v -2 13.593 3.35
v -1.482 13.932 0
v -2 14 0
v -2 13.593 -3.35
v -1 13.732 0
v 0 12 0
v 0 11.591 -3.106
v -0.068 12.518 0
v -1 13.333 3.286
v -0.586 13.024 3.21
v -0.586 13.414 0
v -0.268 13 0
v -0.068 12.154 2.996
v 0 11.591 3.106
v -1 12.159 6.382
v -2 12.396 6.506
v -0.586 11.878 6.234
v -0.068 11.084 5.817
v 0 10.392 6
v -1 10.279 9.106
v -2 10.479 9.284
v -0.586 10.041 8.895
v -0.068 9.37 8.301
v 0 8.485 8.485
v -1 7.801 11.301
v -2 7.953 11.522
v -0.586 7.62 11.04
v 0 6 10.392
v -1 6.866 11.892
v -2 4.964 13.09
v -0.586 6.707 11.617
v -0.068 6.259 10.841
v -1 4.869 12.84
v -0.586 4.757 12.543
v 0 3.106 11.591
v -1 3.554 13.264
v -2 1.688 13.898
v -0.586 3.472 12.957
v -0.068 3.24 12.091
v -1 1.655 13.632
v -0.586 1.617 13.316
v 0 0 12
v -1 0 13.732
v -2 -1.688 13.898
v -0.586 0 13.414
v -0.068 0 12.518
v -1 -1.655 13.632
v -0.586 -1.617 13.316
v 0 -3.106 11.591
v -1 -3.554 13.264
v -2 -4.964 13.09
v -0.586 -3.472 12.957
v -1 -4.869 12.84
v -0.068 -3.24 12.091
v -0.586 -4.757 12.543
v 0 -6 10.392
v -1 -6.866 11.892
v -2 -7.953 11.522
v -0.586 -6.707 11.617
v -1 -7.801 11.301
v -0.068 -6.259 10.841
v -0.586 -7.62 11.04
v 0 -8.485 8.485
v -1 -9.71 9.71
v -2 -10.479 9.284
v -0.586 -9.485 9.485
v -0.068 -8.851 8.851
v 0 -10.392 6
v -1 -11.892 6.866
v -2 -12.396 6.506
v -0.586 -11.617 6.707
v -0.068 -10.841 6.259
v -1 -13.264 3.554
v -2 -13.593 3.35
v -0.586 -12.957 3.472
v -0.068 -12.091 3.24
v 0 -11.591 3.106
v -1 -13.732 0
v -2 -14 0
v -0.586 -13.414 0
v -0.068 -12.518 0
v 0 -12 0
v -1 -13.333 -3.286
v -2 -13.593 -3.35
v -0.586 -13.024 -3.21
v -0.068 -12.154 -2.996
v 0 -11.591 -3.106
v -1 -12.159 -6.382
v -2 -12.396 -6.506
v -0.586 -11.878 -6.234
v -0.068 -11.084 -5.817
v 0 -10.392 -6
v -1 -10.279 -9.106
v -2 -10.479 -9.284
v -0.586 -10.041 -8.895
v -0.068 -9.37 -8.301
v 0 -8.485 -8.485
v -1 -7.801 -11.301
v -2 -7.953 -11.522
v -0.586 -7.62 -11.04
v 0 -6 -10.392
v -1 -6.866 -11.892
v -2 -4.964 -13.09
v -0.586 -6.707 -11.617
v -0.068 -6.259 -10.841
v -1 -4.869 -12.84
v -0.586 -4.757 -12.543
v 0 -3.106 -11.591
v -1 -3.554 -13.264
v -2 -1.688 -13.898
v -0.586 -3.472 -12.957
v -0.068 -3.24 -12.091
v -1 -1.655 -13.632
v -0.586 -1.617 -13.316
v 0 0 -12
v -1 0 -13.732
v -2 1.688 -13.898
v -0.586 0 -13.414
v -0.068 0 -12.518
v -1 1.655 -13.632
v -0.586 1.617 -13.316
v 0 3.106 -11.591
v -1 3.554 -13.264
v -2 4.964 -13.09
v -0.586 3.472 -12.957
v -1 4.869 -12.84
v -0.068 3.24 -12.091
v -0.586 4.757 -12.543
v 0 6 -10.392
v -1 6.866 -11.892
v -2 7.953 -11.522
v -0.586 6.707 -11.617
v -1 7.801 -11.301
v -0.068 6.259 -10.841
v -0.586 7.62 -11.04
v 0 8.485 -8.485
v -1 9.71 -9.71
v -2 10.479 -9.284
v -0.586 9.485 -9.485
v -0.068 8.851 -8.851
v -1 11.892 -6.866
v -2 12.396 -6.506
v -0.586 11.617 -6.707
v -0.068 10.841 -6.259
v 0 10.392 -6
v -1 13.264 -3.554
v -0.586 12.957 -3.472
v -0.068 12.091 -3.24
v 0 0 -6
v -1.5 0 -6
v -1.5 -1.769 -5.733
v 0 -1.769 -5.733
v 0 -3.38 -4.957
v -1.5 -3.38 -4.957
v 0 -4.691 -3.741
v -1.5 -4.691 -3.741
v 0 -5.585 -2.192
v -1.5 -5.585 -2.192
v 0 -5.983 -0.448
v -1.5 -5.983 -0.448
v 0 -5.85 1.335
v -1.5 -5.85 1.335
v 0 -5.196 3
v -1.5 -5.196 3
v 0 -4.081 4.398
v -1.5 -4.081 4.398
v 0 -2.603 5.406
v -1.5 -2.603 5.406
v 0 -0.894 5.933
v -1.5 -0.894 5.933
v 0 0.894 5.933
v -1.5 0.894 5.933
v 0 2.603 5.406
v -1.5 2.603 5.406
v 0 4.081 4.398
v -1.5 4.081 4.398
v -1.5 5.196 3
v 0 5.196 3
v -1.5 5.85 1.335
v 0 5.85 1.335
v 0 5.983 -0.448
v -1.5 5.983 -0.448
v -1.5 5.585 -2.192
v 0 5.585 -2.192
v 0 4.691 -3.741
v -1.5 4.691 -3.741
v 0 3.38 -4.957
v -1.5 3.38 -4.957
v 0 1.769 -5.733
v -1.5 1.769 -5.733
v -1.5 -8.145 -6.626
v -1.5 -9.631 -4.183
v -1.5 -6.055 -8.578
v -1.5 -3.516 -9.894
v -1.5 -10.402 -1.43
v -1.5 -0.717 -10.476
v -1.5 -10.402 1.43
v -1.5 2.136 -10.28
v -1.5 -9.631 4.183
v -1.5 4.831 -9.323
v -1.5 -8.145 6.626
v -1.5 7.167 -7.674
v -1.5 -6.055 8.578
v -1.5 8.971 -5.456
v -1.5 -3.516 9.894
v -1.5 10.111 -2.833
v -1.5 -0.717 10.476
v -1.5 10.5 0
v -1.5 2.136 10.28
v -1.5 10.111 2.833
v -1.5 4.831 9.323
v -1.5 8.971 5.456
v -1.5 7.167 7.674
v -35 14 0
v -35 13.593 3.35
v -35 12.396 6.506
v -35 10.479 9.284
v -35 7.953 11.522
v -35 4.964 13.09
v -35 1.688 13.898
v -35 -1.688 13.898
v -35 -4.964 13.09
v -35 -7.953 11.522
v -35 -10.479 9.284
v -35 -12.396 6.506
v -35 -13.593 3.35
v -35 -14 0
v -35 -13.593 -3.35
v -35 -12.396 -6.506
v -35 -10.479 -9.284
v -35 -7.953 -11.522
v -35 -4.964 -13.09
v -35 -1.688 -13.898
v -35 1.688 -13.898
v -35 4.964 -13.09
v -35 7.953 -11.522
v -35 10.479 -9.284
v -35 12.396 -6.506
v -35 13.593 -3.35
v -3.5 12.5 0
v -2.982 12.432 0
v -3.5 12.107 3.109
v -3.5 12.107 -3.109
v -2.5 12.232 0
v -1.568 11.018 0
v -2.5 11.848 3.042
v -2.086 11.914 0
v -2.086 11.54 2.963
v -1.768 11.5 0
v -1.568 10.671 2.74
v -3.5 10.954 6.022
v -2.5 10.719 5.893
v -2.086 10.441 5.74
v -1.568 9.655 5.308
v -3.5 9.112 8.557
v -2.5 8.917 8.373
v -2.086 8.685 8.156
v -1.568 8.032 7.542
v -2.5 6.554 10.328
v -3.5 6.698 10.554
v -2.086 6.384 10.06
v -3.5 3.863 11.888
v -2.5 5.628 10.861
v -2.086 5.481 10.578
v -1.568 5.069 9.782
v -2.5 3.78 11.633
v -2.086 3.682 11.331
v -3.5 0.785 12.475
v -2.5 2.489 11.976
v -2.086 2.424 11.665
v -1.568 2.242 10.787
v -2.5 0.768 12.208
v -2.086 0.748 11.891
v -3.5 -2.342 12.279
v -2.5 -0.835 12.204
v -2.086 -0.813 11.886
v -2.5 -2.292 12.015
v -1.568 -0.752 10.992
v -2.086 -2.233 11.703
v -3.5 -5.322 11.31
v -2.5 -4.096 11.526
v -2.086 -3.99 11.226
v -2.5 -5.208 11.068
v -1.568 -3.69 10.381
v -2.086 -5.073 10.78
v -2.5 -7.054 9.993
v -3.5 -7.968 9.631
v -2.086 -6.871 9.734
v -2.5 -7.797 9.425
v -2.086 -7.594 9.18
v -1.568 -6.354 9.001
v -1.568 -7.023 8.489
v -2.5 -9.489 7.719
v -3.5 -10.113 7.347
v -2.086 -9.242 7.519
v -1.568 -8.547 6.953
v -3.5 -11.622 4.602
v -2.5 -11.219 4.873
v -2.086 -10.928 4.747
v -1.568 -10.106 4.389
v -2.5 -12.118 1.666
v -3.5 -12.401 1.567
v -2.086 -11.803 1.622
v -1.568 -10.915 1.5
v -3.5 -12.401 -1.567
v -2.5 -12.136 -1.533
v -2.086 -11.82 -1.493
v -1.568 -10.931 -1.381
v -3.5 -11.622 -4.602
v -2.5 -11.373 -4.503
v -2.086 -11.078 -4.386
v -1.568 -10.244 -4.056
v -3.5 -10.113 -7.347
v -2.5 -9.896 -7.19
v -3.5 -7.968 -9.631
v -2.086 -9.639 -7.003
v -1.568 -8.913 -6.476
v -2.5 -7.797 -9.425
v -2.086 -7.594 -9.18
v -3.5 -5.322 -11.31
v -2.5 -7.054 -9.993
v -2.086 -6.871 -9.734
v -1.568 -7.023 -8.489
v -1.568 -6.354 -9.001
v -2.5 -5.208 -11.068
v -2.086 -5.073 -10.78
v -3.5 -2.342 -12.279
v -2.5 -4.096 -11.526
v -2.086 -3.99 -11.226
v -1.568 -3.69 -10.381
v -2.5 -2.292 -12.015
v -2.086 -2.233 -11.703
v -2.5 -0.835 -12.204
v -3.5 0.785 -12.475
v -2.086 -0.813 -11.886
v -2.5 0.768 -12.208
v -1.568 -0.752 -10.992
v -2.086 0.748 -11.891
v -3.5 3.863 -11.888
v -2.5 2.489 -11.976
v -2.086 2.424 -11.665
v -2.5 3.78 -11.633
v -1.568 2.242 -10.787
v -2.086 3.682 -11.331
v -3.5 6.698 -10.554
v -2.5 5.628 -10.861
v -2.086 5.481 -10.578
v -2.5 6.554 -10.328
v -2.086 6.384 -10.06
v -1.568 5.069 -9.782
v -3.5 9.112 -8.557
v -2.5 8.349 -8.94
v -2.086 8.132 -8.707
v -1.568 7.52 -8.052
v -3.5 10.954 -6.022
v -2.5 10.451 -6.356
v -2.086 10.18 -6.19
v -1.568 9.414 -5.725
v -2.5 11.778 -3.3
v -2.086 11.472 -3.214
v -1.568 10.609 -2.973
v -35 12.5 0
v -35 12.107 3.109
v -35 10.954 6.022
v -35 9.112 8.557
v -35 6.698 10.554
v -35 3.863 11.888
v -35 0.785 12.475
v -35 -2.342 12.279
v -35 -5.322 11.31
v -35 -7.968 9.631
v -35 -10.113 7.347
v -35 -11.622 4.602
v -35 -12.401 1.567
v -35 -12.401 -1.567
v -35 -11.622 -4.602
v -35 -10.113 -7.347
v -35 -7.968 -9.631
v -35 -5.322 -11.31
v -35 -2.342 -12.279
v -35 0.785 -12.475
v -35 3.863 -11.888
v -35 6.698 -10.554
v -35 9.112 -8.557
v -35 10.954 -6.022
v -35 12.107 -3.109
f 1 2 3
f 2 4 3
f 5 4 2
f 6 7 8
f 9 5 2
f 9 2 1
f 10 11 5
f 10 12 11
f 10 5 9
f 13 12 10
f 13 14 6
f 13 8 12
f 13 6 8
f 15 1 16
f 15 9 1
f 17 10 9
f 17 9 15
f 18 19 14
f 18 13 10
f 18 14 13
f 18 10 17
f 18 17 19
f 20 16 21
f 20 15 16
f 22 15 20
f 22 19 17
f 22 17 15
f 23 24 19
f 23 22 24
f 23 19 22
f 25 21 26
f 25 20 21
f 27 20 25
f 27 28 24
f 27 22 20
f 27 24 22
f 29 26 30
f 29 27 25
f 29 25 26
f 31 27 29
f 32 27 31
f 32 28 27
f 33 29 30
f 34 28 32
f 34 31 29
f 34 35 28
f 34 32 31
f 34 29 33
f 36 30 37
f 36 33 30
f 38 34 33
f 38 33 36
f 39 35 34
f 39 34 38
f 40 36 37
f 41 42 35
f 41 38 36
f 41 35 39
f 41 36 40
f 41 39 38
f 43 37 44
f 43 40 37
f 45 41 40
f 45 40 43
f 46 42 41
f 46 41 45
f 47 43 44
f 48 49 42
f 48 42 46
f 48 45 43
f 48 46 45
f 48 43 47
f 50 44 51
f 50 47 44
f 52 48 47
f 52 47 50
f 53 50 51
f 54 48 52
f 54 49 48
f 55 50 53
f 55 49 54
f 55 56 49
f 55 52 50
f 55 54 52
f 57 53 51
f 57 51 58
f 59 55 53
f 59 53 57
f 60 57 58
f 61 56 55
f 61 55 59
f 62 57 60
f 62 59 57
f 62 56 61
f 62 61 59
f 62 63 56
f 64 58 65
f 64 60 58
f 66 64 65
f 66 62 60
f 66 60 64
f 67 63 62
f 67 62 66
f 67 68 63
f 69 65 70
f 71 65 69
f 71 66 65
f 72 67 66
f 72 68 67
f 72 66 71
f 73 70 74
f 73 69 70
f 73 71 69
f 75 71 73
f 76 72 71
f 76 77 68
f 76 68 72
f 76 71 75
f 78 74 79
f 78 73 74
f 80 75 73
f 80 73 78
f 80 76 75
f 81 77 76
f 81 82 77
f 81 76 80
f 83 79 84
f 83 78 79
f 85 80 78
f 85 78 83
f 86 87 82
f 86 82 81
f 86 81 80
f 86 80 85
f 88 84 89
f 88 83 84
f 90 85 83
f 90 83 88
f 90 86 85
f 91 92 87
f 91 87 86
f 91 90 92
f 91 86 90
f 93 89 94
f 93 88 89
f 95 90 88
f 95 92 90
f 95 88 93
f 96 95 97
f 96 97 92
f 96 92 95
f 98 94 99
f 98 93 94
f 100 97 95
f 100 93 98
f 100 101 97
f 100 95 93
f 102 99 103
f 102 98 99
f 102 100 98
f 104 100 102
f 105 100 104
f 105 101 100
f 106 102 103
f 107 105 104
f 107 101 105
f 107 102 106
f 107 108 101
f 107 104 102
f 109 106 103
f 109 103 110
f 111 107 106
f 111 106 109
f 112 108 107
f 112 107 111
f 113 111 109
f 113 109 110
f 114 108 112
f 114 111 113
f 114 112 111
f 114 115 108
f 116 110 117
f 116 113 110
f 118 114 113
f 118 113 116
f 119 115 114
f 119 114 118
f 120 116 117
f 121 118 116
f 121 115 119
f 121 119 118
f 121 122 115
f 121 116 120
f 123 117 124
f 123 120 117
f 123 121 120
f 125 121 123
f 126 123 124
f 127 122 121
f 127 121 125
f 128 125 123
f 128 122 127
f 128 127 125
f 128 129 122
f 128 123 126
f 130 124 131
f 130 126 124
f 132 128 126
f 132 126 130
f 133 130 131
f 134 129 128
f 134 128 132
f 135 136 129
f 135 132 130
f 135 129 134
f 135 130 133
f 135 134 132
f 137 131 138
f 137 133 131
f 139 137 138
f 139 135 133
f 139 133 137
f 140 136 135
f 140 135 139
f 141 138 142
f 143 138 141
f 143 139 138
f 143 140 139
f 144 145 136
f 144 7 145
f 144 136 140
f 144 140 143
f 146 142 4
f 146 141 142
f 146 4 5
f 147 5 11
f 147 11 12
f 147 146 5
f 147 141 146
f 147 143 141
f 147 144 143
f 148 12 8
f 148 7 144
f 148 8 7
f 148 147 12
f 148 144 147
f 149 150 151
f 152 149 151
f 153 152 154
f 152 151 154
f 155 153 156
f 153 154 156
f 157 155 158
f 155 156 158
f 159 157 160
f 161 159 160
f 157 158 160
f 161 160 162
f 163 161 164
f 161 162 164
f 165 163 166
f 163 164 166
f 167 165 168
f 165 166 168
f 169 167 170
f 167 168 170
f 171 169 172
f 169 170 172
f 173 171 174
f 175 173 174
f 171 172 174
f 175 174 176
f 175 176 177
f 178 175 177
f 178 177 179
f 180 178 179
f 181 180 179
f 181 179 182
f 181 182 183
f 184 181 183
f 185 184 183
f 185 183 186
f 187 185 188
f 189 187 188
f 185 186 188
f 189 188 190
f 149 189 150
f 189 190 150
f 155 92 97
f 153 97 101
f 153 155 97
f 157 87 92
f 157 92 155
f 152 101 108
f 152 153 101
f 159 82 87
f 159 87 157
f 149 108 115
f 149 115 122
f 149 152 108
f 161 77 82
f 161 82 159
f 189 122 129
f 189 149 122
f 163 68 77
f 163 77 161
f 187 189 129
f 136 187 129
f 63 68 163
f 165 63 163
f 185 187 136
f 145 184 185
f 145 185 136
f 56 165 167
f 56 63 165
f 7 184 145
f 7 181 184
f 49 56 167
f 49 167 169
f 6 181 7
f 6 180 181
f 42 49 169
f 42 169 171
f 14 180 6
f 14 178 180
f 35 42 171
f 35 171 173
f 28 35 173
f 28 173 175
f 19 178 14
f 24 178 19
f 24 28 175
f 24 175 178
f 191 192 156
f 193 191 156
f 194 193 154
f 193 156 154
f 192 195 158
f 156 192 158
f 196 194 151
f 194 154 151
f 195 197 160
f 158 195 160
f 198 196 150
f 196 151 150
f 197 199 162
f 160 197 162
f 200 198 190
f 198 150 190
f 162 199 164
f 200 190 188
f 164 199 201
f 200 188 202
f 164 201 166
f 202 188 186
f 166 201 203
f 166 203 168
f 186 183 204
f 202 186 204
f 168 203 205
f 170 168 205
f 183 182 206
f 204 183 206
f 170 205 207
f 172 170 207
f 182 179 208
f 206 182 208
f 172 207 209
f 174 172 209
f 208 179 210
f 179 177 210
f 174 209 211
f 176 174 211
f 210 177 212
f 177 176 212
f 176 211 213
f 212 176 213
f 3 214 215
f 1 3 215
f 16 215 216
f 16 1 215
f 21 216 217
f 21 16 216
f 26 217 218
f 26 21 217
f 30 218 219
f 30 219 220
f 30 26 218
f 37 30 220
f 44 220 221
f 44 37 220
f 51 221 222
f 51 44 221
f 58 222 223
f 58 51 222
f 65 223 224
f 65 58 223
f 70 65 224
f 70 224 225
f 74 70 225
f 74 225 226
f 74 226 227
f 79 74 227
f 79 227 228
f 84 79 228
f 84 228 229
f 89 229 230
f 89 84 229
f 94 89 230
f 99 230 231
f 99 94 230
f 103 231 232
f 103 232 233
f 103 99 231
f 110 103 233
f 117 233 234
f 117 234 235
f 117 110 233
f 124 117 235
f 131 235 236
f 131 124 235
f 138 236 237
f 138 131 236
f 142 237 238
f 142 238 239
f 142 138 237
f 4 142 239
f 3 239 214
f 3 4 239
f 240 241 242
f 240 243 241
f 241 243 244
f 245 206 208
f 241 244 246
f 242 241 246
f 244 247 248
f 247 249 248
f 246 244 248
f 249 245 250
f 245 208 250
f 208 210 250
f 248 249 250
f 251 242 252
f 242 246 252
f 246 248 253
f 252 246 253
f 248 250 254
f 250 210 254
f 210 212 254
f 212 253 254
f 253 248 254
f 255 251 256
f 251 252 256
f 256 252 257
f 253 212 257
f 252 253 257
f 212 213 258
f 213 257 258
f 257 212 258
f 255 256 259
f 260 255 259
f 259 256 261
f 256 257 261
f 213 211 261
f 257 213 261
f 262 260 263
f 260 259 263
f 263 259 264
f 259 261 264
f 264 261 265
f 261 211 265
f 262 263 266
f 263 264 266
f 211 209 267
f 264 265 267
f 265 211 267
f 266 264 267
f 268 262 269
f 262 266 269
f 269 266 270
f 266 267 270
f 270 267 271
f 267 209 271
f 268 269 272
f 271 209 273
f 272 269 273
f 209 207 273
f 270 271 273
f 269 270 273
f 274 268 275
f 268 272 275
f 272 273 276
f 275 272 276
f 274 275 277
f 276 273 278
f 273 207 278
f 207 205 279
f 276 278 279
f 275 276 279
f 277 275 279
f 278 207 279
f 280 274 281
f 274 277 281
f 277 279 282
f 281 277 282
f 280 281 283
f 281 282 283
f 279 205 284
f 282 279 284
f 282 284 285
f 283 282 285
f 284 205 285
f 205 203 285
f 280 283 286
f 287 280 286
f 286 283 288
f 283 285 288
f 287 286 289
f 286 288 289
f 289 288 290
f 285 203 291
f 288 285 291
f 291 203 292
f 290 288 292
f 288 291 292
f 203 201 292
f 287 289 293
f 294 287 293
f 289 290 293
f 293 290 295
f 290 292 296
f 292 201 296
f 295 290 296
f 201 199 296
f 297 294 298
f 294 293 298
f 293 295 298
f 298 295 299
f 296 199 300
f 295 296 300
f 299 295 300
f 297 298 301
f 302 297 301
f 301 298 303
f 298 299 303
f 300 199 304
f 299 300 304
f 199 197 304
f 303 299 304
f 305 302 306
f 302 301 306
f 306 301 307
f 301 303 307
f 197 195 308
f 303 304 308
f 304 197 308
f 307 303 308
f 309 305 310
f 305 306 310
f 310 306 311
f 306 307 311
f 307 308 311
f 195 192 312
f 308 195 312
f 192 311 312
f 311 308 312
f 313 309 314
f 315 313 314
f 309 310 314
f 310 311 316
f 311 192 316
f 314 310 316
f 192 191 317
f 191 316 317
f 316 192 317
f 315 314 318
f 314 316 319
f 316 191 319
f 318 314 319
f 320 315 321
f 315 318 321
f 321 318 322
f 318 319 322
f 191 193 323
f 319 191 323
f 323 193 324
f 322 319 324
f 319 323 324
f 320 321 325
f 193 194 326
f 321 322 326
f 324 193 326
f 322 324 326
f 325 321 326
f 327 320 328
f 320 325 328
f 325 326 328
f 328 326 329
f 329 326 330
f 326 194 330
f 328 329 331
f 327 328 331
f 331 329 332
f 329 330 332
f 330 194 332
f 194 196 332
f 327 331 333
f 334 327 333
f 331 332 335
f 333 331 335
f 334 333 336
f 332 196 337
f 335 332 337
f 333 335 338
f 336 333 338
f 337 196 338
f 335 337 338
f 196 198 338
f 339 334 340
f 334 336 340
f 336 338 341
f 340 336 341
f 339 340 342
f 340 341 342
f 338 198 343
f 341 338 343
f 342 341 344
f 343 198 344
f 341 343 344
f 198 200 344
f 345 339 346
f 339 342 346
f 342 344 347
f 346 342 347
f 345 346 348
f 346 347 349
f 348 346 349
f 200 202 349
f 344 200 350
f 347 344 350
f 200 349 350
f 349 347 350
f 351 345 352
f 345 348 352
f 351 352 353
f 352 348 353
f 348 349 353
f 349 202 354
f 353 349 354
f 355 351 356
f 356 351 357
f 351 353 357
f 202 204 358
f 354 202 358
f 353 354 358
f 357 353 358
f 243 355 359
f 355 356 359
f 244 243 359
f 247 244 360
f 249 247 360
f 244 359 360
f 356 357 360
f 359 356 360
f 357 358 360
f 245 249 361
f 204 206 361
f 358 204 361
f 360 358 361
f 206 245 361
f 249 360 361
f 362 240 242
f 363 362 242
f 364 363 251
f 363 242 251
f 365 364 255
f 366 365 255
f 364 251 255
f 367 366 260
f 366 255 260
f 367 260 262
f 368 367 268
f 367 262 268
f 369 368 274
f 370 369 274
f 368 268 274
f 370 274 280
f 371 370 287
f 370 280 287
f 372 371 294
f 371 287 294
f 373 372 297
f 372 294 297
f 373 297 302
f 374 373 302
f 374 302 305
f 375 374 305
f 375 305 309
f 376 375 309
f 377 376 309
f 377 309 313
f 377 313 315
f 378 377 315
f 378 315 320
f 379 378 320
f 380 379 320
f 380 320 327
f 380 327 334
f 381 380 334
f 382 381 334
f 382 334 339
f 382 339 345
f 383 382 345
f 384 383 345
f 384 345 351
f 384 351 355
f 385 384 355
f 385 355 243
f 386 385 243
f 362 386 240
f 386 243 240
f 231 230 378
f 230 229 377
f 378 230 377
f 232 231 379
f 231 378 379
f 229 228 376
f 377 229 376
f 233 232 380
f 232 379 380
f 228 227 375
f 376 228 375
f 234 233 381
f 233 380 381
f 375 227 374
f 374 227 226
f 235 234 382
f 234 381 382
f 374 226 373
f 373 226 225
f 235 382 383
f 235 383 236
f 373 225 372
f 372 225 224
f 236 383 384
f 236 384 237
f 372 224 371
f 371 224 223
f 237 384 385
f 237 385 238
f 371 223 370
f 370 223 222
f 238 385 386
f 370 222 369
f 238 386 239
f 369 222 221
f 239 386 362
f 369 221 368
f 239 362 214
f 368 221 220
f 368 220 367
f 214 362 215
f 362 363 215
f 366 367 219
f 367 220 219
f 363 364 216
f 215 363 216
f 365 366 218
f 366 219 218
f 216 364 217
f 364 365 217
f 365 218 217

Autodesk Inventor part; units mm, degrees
ref_plane "YZ Plane" through (0, 0, 0) normal (1, 0, 0) x (0, 1, 0)
ref_plane "XZ Plane" through (0, 0, 0) normal (0, 1, 0) x (-1, 0, 0)
ref_plane "XY Plane" through (0, 0, 0) normal (0, 0, 1) x (1, 0, 0)
sketch "Sketch1" plane through (0, 0, 0) normal (1, 0, 0) x (0, 1, 0)
  circle A0 centre (0, 0) radius 14
  dimension "d0" = 28
extrude "Extrusion1" add sketch "Sketch1" against normal blind 35
shell "Shell1" thickness 1.5 removed faces 1 at (-35, 2.651, 3.8406)
sketch "Sketch2" plane through (0, 0, 0) normal (1, 0, 0) x (0, 0, -1)
  point P0 (0, 0)
hole "Hole1" at (0, 0, 0) direction (-1, 0, 0) diameter 12 end through all
fillet "Fillet1" radius 2 2 edges at (0, -14, 0) (-1.5, -12.5, 0)
properties material "Steel, Mild"
